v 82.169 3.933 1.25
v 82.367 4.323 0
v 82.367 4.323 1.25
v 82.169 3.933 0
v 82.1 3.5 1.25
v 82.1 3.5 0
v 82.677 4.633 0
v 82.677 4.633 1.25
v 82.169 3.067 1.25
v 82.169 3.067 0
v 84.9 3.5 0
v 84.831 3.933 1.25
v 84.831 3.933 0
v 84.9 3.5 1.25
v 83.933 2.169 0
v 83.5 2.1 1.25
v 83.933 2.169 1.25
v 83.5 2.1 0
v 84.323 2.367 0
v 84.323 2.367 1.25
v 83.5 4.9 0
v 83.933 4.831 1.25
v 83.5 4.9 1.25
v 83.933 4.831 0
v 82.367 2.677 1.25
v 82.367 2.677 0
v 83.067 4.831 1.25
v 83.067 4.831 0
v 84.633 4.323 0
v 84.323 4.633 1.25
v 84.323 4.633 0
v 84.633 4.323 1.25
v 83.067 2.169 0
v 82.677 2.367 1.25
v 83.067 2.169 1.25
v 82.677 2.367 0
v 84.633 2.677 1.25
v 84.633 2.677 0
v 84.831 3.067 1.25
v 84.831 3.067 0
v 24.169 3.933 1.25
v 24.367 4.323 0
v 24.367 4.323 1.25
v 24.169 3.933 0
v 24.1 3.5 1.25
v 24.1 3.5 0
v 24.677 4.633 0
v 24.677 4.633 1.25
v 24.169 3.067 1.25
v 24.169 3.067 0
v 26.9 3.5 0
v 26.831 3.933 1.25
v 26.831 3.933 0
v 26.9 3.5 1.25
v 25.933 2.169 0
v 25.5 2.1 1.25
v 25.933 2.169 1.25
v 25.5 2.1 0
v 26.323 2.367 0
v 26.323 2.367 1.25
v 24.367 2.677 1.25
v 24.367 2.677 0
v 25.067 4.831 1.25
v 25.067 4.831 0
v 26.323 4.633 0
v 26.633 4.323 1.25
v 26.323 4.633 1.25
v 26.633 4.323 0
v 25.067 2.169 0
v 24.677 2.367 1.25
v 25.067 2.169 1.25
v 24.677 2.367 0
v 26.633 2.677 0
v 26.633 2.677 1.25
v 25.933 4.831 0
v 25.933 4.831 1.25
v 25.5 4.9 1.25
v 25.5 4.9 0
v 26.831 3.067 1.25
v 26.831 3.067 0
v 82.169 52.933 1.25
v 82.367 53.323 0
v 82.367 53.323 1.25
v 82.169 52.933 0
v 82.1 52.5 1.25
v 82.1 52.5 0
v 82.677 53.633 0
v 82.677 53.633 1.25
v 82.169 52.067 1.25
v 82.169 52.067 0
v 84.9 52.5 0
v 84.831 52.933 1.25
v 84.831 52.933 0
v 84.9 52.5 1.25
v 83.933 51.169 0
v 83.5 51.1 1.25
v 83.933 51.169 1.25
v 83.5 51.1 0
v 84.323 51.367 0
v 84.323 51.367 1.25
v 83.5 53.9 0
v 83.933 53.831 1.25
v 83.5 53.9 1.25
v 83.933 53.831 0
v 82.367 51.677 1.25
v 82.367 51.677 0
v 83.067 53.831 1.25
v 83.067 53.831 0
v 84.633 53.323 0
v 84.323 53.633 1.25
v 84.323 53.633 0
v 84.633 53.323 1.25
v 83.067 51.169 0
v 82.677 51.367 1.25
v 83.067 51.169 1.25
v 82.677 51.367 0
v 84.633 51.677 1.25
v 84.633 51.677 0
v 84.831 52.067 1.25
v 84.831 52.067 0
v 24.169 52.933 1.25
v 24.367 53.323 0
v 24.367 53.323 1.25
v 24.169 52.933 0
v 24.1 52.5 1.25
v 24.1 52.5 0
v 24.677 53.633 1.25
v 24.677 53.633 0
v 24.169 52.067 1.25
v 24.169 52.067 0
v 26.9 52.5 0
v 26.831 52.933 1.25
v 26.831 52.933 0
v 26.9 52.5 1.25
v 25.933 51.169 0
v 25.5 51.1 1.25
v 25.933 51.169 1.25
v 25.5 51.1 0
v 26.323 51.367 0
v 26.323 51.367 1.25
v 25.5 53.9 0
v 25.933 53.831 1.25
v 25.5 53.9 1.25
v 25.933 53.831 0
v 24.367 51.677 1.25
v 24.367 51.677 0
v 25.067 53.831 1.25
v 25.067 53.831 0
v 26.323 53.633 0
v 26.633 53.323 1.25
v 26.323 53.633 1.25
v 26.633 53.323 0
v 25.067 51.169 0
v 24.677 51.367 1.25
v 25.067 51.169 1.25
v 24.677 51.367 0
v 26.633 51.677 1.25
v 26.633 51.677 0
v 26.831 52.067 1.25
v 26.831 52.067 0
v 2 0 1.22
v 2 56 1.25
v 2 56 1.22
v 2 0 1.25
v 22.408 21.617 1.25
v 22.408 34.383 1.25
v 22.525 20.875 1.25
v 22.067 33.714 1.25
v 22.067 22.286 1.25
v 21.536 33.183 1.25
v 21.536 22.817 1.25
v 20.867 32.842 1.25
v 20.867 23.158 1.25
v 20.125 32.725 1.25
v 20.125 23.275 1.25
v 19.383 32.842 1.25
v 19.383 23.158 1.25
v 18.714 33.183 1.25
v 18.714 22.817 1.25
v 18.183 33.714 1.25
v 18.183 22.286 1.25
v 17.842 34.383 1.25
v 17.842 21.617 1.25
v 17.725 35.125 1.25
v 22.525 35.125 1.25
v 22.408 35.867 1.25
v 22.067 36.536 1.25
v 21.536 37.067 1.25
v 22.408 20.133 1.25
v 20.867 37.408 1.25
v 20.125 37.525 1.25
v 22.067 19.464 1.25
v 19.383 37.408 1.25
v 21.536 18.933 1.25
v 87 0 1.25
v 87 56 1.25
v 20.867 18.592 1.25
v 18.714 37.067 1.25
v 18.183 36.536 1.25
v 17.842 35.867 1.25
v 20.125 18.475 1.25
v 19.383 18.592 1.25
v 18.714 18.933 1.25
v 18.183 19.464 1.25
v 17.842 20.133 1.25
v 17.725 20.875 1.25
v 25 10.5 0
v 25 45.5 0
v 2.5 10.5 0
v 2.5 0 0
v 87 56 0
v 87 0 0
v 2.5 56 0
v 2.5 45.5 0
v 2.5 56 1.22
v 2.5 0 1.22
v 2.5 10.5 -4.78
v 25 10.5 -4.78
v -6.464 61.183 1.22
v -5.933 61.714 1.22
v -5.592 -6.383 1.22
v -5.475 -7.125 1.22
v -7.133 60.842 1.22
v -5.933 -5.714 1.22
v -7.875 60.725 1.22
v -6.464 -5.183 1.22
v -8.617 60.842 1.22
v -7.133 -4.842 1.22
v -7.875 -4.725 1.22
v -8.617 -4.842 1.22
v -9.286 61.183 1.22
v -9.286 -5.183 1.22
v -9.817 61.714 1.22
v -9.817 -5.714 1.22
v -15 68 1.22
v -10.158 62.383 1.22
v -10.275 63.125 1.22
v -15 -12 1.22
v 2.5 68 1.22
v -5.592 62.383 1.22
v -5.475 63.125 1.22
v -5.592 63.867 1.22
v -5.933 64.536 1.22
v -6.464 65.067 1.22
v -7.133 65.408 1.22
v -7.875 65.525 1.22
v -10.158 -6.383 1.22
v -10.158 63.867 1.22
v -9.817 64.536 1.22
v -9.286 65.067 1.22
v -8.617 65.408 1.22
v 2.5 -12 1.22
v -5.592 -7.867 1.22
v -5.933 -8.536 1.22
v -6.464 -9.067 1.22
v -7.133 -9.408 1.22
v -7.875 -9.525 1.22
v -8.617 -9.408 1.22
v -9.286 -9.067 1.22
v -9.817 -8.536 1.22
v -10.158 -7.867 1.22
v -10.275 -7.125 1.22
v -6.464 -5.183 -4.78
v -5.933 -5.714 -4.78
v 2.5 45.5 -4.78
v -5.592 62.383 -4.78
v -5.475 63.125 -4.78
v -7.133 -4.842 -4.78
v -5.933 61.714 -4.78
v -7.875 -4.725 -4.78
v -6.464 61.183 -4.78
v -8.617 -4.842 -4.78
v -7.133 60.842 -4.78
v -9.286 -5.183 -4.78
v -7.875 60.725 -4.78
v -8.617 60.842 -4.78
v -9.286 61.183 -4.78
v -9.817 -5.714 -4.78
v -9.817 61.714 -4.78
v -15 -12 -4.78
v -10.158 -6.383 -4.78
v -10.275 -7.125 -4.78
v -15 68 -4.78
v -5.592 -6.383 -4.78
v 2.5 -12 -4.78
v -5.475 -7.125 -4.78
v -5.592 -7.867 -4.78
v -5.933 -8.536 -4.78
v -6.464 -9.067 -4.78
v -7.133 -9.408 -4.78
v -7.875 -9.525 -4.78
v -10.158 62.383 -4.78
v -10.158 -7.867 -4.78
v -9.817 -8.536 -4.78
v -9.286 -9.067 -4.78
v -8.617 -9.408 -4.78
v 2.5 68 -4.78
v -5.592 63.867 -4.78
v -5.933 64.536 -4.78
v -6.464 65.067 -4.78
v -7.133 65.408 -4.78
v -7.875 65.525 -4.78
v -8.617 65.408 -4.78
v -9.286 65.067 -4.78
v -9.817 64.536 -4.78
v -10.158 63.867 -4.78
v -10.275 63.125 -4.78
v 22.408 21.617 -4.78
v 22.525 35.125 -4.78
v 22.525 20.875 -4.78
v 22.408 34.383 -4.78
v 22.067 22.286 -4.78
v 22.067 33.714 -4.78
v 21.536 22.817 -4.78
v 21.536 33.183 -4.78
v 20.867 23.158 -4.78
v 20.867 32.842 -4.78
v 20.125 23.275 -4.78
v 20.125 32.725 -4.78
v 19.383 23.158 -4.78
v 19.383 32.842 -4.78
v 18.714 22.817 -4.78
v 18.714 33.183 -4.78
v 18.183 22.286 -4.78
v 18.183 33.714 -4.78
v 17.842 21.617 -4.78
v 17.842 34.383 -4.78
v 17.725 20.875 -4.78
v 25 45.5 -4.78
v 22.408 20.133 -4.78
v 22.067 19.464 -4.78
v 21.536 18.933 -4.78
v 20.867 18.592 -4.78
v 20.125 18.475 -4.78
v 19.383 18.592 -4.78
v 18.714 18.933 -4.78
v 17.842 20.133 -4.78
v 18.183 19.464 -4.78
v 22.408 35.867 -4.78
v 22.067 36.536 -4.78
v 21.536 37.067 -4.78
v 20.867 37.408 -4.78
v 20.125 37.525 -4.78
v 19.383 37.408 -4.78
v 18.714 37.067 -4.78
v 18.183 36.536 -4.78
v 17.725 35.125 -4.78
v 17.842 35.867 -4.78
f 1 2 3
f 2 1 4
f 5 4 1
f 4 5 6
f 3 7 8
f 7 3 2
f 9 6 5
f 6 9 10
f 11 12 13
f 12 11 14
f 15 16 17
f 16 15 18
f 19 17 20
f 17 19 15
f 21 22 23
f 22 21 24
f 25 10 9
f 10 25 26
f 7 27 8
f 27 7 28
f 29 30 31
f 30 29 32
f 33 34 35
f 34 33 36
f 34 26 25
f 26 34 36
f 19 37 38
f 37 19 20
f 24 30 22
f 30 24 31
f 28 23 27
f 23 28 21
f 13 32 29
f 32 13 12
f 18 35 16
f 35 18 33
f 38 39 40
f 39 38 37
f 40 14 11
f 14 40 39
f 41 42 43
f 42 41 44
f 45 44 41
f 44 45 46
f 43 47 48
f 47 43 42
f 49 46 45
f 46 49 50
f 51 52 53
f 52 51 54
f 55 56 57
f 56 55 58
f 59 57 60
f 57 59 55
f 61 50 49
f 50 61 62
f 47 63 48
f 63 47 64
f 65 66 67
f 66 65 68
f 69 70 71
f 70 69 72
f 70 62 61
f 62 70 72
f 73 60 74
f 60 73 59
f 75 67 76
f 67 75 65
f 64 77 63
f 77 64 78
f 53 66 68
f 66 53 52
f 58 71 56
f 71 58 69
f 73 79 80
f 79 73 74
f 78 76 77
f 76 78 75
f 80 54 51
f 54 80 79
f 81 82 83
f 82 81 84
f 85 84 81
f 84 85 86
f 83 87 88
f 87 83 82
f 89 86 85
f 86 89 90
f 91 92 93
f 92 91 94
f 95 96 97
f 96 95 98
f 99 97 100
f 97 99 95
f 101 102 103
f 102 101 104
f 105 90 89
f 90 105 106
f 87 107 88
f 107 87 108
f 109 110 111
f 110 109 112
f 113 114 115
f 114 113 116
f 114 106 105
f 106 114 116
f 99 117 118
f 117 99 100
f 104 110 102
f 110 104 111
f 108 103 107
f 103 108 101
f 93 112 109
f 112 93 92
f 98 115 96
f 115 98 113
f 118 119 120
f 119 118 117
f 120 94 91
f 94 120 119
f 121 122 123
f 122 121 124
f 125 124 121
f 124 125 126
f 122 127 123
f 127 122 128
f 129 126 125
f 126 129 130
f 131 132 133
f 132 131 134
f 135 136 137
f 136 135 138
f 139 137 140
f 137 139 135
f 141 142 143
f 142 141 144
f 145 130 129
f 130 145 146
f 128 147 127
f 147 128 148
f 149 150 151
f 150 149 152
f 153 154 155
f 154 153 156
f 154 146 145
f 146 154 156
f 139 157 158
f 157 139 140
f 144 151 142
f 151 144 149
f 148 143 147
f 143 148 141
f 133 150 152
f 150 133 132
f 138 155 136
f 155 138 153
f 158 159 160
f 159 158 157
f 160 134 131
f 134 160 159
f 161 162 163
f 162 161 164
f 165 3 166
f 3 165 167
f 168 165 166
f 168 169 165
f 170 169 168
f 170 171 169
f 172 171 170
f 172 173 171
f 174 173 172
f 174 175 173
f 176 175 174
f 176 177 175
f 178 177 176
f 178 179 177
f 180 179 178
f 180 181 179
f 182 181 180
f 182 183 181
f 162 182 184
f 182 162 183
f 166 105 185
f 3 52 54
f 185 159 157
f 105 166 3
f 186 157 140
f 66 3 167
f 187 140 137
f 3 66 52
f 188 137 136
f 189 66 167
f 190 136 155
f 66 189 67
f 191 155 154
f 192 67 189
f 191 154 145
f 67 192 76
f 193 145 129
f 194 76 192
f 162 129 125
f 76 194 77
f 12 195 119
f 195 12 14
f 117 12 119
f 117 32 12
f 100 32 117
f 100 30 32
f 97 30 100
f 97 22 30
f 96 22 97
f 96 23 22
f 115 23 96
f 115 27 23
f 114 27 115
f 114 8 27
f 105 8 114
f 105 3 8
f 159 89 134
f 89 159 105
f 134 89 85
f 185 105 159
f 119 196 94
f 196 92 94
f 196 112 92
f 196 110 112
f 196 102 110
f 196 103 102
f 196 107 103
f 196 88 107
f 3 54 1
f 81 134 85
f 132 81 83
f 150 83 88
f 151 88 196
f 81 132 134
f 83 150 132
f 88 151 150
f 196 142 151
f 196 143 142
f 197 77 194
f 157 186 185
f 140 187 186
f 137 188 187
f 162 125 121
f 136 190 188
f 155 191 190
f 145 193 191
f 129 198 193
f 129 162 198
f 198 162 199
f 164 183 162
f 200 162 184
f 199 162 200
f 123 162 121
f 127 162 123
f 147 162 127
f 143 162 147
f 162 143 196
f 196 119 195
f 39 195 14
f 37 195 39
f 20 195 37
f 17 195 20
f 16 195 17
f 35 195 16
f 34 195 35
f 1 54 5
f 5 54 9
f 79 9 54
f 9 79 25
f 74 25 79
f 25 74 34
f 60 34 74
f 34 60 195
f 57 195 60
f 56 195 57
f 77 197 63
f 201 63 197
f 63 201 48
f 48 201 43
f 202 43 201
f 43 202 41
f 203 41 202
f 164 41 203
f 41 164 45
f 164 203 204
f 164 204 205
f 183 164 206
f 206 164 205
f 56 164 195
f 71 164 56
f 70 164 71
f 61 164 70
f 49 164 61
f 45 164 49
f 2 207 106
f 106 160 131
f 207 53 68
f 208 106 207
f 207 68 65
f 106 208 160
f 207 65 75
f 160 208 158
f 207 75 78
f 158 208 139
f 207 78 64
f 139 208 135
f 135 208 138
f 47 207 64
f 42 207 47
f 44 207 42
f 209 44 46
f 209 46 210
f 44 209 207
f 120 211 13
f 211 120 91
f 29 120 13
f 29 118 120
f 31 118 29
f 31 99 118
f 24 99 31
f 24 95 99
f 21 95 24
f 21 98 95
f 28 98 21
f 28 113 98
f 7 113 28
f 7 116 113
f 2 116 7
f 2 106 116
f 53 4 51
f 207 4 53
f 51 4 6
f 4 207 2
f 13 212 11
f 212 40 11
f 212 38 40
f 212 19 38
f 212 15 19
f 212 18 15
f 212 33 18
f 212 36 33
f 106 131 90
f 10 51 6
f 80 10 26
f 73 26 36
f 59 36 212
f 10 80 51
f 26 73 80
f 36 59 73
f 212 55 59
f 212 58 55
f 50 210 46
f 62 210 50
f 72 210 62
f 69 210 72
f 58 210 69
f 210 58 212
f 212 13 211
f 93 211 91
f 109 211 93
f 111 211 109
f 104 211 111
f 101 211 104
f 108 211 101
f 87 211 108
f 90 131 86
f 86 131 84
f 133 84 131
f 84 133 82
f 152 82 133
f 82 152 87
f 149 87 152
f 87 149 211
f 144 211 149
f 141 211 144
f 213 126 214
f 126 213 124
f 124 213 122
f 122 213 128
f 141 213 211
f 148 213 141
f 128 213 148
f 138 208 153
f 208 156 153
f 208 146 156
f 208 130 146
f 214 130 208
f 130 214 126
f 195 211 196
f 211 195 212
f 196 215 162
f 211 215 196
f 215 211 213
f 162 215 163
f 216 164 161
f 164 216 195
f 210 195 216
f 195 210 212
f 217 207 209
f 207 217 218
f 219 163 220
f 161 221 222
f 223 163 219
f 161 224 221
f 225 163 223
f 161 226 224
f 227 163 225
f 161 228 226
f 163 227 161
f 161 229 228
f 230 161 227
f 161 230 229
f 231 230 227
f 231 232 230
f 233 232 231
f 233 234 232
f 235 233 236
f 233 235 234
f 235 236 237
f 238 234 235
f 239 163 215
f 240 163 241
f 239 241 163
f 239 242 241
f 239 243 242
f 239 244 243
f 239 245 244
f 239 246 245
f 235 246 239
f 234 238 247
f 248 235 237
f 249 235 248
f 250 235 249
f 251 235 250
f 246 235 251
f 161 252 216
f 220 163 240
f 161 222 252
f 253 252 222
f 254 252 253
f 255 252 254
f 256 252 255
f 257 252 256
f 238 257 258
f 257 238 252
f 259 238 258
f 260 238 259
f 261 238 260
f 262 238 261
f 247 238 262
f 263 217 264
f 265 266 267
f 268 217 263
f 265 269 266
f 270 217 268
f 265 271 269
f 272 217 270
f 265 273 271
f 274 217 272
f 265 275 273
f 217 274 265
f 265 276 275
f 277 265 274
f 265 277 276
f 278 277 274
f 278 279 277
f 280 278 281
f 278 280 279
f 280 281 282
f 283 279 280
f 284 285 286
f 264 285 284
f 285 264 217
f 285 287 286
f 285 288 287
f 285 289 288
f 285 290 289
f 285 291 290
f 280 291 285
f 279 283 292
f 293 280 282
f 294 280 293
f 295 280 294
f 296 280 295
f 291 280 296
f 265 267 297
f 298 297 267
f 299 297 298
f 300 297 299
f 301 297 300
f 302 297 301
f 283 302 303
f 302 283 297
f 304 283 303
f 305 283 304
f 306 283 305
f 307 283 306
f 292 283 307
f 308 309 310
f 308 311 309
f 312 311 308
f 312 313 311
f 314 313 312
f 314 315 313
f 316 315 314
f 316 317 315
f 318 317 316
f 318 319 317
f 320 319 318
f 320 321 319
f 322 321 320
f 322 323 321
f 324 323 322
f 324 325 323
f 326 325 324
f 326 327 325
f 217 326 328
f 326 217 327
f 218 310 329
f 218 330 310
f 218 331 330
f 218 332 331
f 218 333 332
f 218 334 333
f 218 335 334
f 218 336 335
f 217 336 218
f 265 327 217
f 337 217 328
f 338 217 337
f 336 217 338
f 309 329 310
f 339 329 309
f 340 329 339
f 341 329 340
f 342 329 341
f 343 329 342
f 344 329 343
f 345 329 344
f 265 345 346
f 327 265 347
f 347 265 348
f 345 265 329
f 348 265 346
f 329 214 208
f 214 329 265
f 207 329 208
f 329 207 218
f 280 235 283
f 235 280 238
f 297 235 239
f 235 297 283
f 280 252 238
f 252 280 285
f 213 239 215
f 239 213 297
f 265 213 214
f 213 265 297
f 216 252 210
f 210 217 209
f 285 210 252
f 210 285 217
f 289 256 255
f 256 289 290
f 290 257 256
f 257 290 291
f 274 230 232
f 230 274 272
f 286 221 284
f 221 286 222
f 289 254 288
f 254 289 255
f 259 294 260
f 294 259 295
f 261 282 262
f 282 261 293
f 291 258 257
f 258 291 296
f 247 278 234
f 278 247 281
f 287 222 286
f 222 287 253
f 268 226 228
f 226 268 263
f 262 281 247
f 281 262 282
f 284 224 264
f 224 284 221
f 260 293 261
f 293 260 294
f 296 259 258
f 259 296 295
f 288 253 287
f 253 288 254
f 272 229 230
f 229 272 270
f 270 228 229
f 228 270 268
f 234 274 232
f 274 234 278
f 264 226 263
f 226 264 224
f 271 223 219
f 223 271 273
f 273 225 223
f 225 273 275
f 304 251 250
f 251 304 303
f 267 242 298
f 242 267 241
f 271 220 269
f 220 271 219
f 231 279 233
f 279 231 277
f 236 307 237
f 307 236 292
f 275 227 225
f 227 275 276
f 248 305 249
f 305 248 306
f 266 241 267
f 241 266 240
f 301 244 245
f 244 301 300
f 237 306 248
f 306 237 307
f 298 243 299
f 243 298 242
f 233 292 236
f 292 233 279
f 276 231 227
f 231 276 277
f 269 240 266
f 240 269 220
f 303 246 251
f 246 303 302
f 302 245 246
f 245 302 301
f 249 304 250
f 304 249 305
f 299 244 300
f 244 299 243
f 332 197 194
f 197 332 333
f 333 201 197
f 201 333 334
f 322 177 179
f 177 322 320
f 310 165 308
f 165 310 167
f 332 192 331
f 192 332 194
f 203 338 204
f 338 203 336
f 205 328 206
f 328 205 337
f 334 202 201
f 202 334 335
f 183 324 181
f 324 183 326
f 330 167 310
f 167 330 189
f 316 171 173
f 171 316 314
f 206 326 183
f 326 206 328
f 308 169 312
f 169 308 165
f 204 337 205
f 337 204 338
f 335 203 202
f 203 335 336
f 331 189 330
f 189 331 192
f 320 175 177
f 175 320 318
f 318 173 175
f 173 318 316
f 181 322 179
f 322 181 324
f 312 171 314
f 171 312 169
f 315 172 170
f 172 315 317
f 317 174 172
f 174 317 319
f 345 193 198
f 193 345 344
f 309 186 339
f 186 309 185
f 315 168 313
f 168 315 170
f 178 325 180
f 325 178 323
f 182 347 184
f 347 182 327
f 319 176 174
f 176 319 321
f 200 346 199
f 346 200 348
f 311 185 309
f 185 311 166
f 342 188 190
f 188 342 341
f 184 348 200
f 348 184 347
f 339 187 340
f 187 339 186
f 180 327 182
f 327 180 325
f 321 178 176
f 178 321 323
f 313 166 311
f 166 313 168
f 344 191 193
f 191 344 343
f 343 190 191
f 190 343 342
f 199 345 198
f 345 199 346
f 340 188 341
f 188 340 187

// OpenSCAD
//Shut your Pi Hole! 
//An OpenSCAD library to assist with designing Raspberry Pi accessories

//This work is licensed under the Creative Commons Attribution-ShareAlike 4.0 International License. To view a copy of this license, visit http://creativecommons.org/licenses/by-sa/4.0/.
//© 2016 Dale Price

//Pi dimensions sourced from https://www.raspberrypi.org/documentation/hardware/raspberrypi/mechanical/
//Currently supports "1B", "1A+", "1B+", "2B", "3B", "Zero"

//get vector of [x,y] vectors of locations of mounting holes based on Pi version
function piHoleLocations (board="3B") = 
	(board=="1A+" || board=="1B+" || board=="2B" || board=="3B") ?
		[[3.5, 3.5], [61.5, 3.5], [3.5, 52.5], [61.5, 52.5]] : //pi 1B+, 2B, 3B
	(board=="Zero") ?
		[[3.5, 3.5], [61.5, 3.5], [3.5, 26.5], [61.5, 26.5]] : //pi zero
	(board=="1B") ?
		[[80, 43.5], [25, 17.5]] :
	[]; //invalid board

//get vector of [x,y,z] dimensions of board
//	dimensions are for PCB only, not ports or anything else
function piBoardDim (board="3B") =
	(board=="1B" || board=="1B+" || board=="2B" || board=="3B") ?
		[85, 56, 1.25] :
	(board=="Zero") ?
		[65, 30, 1.25] :
	(board == "1A+") ?
		[65, 56, 1.25] :
	[0,0,0];

//Mounting holes for a Raspberry Pi of the specified version
//	Parameters
//		board: the version of the raspberry pi to generate holes for
//		depth: the depth of the holes in mm
module piHoles (board, depth = 5, preview=true) {
	hd = 2.8; //radius of pi mounting holes plus a tiny bit extra to account for shrinkage when 3D printing
	hr = hd/2;

	//preview of the board itself
	if(preview==true)
		% piBoard(board);
	
	//mounting holes
	for(holePos = piHoleLocations(board)) {
		translate([holePos[0], holePos[1], -depth]) cylinder(d=hd, h=depth);
	}
}

//Preview of board dimensions for Raspberry Pi of the specified version
module piBoard (board) {
	difference() {
		cube(piBoardDim(board), center=false);
		translate([0,0,piBoardDim(board)[2] + 0.01]) piHoles(board, piBoardDim(board)[2] + 0.02, false);
	}

	//warn about possible inaccuracy of boards that don't currently have official documentation
	if(board == "1B") {
		echo("CAUTION: The mounting hole positions for the board you have selected may not be accurate because the Raspberry Pi Foundation does not currently provide official mechanical drawings for it.");
	}
}

//Snap-fit posts for mounting the Raspberry Pi
//	Parameters
//		board: version of the raspberry pi to mount
//		height: height of the top surface of the raspberry pi board off the base of the posts
//		preview: whether or not to show a preview of the board in place
module piPosts(board, height=5, preview=true) {
	piSize = piBoardDim(board);
	piHolePos = piHoleLocations(board);

	module pcbPost(height) {
		cylinder(d=2, h=height);
		cylinder(d1=5, d2=2, h=height - piSize[2] - 0.25);

		translate([0, 0.4, height]) scale([1.1, 1.1, 1]) cylinder(d=2, h=0.5);
	}
	
	for(holePos = piHolePos) {
		translate([holePos[0], holePos[1], 0]) pcbPost(height);
	}

	if(preview==true)
		% translate([0,0,height-piSize[2]]) piBoard(board);
}

//farHole = 65;
//closeHole=19.5;
//bracketWidth=30;
//bracketHeight=75;

// 16 newer panels
farHole = 14.25;
closeHole = 70.25;
bracketWidth=35;
bracketHeight=80;


terminalHoleWidth=53;
bracketThickness=6;

screwDiameter = 4.8;
screwRadius=screwDiameter/2;



module half_bracket() {
    halfBracketThickness=bracketThickness;
    difference(){
        union(){
    translate([0,bracketHeight/4,0]) cube([bracketWidth,bracketHeight/2,halfBracketThickness],center=true);
    rotate(90) translate([bracketWidth/4,0,0])cube([bracketWidth/2,bracketHeight,halfBracketThickness],center=true);
        }
        union(){
               color("green") translate([closeHole/2,farHole/2,0]) cylinder(r=screwRadius,h=20,center=true);
               color("green") translate([-closeHole/2,farHole/2,0]) cylinder(r=screwRadius,h=20,center=true);
               color("green") translate([farHole/2,closeHole/2,0]) cylinder(r=screwRadius,h=20,center=true);
               color("green") translate([-farHole/2,closeHole/2,0]) cylinder(r=screwRadius,h=20,center=true);
        }
    }

}

color("DarkGreen", 1, $fn=20) {
    difference() {
        union(){
	mirror([1,0,0]) translate([-87,0,0])piBoard("3B");
    translate([-15,28,-1.78]) rotate([0,0,-90])half_bracket();
        }
        translate([-15,28,-0.8]) rotate([0,0,-90]){
               color("green") translate([closeHole/2,farHole/2,0]) cylinder(r=screwRadius,h=20,center=true);
               color("green") translate([-closeHole/2,farHole/2,0]) cylinder(r=screwRadius,h=20,center=true);
                color("green") translate([farHole/2,closeHole/2,0]) cylinder(r=screwRadius,h=20,center=true);
               color("green") translate([-farHole/2,closeHole/2,0]) cylinder(r=screwRadius,h=20,center=true);
       }
    }
    //piPosts("3B");
}
